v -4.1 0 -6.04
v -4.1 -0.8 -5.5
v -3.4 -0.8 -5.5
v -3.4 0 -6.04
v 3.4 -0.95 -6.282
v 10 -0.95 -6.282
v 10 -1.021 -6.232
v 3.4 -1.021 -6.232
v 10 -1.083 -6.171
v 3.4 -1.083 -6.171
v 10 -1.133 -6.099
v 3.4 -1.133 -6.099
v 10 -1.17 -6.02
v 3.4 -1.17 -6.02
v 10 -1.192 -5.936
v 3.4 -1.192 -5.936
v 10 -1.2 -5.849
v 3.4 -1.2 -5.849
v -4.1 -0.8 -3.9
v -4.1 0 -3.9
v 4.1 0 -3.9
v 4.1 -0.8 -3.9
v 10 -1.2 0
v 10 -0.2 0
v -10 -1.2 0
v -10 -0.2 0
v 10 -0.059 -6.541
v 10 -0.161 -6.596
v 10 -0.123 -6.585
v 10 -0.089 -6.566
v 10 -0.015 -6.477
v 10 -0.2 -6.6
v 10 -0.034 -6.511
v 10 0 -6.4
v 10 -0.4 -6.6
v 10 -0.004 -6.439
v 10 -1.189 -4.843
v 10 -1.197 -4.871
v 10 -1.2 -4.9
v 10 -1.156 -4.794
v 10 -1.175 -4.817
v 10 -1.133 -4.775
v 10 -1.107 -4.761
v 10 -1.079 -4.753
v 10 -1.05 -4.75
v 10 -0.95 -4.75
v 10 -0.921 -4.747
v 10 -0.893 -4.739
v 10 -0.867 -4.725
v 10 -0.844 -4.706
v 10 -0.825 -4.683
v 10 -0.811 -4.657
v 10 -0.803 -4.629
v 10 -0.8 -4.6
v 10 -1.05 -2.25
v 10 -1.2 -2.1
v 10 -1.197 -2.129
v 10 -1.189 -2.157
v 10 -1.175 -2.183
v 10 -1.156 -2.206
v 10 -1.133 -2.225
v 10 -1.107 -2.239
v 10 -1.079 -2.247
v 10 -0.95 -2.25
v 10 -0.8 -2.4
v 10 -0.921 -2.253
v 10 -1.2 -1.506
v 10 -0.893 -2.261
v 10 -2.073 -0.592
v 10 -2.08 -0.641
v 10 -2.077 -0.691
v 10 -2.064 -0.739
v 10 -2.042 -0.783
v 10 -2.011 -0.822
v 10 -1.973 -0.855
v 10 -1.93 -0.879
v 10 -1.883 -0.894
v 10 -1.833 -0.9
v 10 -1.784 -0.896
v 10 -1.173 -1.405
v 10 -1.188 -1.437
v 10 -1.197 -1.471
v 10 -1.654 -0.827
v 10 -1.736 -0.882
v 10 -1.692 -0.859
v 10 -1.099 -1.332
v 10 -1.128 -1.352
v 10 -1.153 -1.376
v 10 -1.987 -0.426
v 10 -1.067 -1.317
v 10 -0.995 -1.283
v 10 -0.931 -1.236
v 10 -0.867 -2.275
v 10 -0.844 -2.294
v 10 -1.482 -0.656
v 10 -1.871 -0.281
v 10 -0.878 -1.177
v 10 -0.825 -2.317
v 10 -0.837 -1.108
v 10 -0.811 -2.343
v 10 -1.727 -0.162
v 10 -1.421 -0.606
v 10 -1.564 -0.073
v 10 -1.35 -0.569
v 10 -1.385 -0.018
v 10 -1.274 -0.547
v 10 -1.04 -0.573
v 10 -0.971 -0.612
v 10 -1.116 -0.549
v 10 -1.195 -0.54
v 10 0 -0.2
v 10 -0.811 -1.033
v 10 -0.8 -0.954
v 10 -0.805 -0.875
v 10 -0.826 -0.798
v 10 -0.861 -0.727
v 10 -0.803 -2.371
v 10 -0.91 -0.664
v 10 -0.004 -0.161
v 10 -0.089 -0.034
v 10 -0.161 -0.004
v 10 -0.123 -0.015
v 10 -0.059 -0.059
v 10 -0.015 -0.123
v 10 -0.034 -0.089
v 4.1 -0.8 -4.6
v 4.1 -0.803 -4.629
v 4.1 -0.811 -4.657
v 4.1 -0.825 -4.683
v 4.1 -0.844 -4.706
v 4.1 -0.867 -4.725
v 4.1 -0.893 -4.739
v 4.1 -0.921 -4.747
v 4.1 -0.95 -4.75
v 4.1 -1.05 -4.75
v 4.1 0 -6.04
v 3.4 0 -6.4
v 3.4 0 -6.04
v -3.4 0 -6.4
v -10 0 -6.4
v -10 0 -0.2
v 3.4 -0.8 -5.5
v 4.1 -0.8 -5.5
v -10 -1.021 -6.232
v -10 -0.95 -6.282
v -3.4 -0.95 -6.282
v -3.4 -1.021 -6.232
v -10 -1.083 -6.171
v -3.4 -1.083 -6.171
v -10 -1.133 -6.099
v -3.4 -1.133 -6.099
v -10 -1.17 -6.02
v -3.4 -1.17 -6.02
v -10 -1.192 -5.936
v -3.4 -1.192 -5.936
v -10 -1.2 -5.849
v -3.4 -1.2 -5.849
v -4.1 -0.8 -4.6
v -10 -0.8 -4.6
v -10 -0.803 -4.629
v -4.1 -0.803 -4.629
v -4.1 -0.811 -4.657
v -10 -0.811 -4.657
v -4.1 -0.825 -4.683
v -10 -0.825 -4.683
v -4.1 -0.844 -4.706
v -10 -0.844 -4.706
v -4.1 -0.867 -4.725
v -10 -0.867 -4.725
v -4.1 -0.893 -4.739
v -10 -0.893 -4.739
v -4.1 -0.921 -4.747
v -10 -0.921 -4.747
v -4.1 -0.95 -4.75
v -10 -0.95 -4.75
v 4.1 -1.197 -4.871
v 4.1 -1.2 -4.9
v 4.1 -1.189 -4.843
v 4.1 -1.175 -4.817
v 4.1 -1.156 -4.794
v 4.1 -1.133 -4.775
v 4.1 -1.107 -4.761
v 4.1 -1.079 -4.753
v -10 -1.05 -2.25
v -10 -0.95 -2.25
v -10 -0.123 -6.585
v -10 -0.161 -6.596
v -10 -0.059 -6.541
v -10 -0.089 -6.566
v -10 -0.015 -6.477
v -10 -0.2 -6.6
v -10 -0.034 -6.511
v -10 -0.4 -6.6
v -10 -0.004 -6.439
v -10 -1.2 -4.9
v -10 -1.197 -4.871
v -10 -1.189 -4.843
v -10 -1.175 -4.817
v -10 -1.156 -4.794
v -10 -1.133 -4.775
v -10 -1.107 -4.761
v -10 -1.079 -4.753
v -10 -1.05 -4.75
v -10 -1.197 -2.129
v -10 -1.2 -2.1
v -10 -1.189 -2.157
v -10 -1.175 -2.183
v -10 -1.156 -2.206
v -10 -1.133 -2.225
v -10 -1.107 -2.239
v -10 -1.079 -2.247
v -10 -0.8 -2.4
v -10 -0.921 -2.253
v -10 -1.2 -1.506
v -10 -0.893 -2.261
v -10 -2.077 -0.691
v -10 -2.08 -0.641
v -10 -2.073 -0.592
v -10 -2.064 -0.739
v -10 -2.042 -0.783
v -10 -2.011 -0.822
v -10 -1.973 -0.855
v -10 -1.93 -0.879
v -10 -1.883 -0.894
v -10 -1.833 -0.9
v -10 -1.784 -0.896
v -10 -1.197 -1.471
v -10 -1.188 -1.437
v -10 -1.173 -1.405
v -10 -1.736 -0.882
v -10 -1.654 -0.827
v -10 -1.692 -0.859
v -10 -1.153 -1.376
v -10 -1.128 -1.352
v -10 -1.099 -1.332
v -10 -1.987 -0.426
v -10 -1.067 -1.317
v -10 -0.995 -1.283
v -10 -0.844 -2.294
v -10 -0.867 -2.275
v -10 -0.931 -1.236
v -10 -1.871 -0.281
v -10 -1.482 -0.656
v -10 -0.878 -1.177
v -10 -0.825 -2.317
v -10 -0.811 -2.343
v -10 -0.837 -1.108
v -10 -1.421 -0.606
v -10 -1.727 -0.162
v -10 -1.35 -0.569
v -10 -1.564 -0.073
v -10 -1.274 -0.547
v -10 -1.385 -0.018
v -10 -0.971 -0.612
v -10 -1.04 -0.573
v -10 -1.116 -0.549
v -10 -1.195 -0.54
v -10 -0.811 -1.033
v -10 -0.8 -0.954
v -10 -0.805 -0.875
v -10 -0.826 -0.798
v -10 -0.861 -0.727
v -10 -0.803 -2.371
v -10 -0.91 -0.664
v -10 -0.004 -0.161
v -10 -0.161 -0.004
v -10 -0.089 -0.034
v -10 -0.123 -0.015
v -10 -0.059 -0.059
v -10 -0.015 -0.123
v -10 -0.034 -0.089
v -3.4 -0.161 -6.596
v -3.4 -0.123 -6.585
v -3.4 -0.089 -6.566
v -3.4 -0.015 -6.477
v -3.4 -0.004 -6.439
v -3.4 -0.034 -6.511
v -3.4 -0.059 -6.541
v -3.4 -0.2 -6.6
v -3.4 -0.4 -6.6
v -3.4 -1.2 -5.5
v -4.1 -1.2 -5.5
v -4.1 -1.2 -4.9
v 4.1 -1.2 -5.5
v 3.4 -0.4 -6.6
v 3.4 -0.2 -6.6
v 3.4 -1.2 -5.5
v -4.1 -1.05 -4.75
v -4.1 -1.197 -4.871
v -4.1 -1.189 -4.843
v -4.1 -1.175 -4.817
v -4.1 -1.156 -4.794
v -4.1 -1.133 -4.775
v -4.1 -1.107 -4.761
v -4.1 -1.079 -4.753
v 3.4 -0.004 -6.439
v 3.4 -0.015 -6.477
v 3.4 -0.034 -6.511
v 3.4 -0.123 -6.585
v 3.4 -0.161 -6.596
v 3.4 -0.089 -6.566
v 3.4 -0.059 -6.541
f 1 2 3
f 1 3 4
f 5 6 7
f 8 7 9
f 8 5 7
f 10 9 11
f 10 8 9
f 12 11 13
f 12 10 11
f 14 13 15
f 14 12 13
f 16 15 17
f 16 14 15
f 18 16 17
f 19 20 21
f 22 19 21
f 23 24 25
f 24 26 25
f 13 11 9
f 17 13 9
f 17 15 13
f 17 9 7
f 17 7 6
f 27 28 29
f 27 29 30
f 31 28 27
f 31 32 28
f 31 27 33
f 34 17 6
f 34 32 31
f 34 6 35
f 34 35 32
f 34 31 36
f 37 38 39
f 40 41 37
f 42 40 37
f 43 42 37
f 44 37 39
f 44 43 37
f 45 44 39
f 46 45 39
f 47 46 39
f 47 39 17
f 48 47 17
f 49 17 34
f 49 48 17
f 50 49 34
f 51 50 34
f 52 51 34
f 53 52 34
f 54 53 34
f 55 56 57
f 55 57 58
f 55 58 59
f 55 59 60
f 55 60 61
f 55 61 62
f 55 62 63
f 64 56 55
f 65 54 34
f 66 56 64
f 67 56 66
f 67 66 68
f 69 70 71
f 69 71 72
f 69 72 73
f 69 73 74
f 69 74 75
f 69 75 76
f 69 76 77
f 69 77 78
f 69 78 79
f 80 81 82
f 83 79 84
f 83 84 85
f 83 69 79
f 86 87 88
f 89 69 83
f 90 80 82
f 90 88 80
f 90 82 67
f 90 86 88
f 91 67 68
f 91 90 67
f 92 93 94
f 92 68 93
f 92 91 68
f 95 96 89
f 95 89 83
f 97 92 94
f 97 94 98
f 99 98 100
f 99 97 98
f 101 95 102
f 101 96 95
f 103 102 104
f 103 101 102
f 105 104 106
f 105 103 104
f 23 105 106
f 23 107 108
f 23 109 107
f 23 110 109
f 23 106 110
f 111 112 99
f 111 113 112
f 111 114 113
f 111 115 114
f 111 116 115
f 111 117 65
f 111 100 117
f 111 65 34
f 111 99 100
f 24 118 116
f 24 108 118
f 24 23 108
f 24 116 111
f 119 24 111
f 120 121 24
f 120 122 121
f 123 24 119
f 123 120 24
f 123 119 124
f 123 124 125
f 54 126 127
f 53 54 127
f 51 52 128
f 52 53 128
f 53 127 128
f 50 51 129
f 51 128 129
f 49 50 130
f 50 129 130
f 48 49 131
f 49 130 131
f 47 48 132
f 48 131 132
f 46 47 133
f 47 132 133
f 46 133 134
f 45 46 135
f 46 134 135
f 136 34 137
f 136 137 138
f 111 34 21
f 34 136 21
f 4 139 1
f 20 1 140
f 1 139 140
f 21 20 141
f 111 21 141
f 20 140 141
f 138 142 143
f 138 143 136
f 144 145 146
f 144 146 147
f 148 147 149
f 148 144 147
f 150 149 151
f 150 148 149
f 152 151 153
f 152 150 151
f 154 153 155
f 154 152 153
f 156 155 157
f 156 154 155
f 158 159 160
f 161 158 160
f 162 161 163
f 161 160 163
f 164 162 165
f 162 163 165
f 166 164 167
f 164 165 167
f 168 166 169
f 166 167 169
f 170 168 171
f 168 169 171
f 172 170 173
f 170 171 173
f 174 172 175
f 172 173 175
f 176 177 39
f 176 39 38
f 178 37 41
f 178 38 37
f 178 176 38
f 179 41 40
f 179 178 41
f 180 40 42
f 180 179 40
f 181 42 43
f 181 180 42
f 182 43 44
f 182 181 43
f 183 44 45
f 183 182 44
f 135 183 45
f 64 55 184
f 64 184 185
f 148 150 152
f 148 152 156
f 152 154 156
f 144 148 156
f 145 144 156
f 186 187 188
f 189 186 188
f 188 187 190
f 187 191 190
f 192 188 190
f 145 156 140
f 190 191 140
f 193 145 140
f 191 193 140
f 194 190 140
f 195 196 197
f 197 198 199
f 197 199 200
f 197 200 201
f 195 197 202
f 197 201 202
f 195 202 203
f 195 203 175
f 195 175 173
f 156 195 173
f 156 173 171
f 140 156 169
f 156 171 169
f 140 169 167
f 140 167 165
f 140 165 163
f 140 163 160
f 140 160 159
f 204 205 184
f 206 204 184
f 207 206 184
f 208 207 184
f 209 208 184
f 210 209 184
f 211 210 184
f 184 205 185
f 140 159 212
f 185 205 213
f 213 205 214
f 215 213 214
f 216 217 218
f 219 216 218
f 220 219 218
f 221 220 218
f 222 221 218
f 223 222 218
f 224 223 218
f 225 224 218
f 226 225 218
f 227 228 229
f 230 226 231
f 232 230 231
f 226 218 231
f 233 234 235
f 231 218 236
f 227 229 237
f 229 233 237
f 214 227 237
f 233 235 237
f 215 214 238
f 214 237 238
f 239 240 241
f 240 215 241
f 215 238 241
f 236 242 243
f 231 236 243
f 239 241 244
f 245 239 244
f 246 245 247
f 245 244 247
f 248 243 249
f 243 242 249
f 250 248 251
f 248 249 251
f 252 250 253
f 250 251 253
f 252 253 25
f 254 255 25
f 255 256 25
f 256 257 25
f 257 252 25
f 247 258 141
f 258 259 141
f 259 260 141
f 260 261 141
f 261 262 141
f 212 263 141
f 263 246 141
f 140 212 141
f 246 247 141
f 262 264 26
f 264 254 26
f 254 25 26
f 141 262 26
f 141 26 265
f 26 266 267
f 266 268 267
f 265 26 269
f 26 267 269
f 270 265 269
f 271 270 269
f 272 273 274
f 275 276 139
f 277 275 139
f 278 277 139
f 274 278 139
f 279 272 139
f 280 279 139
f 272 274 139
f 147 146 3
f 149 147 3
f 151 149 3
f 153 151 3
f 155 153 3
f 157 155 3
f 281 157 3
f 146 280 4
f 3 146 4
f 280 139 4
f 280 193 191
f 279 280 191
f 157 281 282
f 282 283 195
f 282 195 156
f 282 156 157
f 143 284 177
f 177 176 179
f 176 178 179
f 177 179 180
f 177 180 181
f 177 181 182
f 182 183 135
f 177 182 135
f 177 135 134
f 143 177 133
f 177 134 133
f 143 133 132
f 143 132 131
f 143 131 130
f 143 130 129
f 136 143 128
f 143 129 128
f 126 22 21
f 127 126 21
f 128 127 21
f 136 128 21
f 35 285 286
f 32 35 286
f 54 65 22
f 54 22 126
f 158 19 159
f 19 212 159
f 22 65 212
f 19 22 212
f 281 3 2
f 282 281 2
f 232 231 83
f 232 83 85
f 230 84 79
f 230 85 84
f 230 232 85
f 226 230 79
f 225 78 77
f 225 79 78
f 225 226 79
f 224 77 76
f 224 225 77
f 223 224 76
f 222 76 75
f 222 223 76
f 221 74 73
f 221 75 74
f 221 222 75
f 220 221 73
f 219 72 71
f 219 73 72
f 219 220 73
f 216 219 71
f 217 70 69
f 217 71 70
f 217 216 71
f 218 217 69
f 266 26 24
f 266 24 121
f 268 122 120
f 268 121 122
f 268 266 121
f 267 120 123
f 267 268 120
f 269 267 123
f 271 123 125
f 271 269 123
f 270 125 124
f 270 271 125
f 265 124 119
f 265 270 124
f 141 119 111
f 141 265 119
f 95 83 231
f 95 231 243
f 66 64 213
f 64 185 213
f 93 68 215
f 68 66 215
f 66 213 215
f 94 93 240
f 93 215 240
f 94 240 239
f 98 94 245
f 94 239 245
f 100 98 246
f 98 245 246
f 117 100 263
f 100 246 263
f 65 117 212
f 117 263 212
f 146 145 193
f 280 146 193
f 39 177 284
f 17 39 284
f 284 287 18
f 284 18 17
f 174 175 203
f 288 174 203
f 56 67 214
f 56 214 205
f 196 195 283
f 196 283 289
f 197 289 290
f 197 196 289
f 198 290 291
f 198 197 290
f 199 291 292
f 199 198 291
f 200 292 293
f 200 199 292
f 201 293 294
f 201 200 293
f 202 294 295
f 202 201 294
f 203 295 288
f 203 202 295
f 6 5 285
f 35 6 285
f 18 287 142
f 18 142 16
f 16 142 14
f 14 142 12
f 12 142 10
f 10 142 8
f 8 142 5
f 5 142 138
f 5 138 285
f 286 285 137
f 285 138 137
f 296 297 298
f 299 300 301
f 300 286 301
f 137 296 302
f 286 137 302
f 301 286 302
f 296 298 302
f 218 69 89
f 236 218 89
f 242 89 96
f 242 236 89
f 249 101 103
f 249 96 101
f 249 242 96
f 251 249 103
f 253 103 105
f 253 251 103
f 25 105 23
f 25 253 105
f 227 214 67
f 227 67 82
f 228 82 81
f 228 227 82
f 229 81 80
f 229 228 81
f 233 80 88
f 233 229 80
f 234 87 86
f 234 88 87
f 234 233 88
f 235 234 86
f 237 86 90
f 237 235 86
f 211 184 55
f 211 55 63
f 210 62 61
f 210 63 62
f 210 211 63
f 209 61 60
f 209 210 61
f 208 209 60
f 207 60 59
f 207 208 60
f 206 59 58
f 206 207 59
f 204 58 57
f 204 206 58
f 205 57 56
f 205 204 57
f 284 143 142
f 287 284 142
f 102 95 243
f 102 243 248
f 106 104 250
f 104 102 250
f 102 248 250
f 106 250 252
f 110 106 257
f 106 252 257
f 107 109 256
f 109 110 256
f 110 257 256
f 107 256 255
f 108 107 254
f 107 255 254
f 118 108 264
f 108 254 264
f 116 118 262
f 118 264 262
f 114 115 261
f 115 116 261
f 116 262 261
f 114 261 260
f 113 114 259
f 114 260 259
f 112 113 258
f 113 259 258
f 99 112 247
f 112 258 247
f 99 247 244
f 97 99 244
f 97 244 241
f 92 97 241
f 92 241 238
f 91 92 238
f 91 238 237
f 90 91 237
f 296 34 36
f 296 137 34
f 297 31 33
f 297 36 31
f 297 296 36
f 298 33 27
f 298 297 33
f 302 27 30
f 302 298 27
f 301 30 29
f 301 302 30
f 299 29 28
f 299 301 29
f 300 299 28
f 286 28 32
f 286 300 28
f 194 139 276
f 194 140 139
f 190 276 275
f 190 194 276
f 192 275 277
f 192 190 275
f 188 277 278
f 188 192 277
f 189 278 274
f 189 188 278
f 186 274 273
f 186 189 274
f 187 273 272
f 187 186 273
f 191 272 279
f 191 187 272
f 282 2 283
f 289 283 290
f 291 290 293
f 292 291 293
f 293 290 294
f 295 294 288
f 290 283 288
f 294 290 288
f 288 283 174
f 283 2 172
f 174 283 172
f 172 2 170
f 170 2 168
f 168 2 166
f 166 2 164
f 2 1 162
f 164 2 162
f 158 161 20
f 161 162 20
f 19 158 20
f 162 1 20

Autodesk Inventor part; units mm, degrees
sketch "Sketch_1" plane through (0, 0, 0) normal (1, 0, 0) x (0, 1, 0)
  line L0 (-0.2, 0) -> (-1.2, 0)
  arc A0 (-1.2, 0) -> (-2.0731, -0.5918) centre (-1.2, -0.94) ccw
  arc A1 (-2.0731, -0.5918) -> (-1.6536, -0.8272) centre (-1.83, -0.65) ccw
  line L1 (-1.6536, -0.8272) -> (-1.4822, -0.6565)
  arc A2 (-1.0667, -1.3171) -> (-1.4822, -0.6565) centre (-1.2, -0.94) ccw
  arc A3 (-1.0667, -1.3171) -> (-1.2, -1.5057) centre (-1, -1.5057) ccw
  line L2 (-1.2, -1.5057) -> (-1.2, -2.1)
  arc A4 (-1.2, -2.1) -> (-1.05, -2.25) centre (-1.05, -2.1) ccw
  line L3 (-1.05, -2.25) -> (-0.95, -2.25)
  arc A5 (-0.8, -2.4) -> (-0.95, -2.25) centre (-0.95, -2.4) ccw
  line L4 (-0.8, -2.4) -> (-0.8, -4.6)
  arc A6 (-0.95, -4.75) -> (-0.8, -4.6) centre (-0.95, -4.6) ccw
  line L5 (-0.95, -4.75) -> (-1.05, -4.75)
  arc A7 (-1.05, -4.75) -> (-1.2, -4.9) centre (-1.05, -4.9) ccw
  line L6 (-1.2, -4.9) -> (-1.2, -5.8494)
  arc A8 (-1.2, -5.8494) -> (-0.95, -6.2825) centre (-0.7, -5.8494) ccw
  line L7 (-0.95, -6.2825) -> (-0.4, -6.6)
  line L8 (-0.4, -6.6) -> (-0.2, -6.6)
  arc A9 (-0.2, -6.6) -> (0, -6.4) centre (-0.2, -6.4) ccw
  line L9 (0, -6.4) -> (0, -0.2)
  arc A10 (0, -0.2) -> (-0.2, 0) centre (-0.2, -0.2) ccw
extrude "Extrusion1" add sketch "Sketch_1" along normal mid plane 20
sketch "Sketch_2" plane through (0, 0, 0) normal (0, 1, 0) x (-1, 0, 0)
  line L0 (4.1, -3.9) -> (-4.1, -3.9)
  line L1 (-4.1, -3.9) -> (-4.1, -5.5)
  line L2 (-4.1, -5.5) -> (-3.4, -5.5)
  line L3 (-3.4, -5.5) -> (-3.4, -6.9)
  line L4 (-3.4, -6.9) -> (3.4, -6.9)
  line L5 (3.4, -6.9) -> (3.4, -5.5)
  line L6 (3.4, -5.5) -> (4.1, -5.5)
  line L7 (4.1, -5.5) -> (4.1, -3.9)
extrude "Extrusion2" cut sketch "Sketch_2" against normal blind 2
sketch "Sketch_4" plane through (0, 0, 0) normal (1, 0, 0) x (0, 1, 0)
  line L0 (0.2, -5.3) -> (-1.0965, -5.3)
  line L1 (-1.0965, -5.3) -> (0.2, -6.1745)
  line L2 (0.2, -6.1745) -> (0.2, -5.3)
extrude "Extrusion3" cut sketch "Sketch_4" along normal mid plane 8.2
ref_plane "mitBHZ_XY" through (0, -1.2, -3.9) normal (0, 1, 0) x (1, 0, 0)
ref_plane "mitBHZ_YZ" through (0, -1.2, -3.9) normal (1, 0, 0) x (0, 0, -1)
ref_plane "mitBHZ_ZX" through (0, -1.2, -3.9) normal (0, 0, -1) x (0, 1, 0)
properties part number "ESG 6.6x20 BHZ 1082540000"
